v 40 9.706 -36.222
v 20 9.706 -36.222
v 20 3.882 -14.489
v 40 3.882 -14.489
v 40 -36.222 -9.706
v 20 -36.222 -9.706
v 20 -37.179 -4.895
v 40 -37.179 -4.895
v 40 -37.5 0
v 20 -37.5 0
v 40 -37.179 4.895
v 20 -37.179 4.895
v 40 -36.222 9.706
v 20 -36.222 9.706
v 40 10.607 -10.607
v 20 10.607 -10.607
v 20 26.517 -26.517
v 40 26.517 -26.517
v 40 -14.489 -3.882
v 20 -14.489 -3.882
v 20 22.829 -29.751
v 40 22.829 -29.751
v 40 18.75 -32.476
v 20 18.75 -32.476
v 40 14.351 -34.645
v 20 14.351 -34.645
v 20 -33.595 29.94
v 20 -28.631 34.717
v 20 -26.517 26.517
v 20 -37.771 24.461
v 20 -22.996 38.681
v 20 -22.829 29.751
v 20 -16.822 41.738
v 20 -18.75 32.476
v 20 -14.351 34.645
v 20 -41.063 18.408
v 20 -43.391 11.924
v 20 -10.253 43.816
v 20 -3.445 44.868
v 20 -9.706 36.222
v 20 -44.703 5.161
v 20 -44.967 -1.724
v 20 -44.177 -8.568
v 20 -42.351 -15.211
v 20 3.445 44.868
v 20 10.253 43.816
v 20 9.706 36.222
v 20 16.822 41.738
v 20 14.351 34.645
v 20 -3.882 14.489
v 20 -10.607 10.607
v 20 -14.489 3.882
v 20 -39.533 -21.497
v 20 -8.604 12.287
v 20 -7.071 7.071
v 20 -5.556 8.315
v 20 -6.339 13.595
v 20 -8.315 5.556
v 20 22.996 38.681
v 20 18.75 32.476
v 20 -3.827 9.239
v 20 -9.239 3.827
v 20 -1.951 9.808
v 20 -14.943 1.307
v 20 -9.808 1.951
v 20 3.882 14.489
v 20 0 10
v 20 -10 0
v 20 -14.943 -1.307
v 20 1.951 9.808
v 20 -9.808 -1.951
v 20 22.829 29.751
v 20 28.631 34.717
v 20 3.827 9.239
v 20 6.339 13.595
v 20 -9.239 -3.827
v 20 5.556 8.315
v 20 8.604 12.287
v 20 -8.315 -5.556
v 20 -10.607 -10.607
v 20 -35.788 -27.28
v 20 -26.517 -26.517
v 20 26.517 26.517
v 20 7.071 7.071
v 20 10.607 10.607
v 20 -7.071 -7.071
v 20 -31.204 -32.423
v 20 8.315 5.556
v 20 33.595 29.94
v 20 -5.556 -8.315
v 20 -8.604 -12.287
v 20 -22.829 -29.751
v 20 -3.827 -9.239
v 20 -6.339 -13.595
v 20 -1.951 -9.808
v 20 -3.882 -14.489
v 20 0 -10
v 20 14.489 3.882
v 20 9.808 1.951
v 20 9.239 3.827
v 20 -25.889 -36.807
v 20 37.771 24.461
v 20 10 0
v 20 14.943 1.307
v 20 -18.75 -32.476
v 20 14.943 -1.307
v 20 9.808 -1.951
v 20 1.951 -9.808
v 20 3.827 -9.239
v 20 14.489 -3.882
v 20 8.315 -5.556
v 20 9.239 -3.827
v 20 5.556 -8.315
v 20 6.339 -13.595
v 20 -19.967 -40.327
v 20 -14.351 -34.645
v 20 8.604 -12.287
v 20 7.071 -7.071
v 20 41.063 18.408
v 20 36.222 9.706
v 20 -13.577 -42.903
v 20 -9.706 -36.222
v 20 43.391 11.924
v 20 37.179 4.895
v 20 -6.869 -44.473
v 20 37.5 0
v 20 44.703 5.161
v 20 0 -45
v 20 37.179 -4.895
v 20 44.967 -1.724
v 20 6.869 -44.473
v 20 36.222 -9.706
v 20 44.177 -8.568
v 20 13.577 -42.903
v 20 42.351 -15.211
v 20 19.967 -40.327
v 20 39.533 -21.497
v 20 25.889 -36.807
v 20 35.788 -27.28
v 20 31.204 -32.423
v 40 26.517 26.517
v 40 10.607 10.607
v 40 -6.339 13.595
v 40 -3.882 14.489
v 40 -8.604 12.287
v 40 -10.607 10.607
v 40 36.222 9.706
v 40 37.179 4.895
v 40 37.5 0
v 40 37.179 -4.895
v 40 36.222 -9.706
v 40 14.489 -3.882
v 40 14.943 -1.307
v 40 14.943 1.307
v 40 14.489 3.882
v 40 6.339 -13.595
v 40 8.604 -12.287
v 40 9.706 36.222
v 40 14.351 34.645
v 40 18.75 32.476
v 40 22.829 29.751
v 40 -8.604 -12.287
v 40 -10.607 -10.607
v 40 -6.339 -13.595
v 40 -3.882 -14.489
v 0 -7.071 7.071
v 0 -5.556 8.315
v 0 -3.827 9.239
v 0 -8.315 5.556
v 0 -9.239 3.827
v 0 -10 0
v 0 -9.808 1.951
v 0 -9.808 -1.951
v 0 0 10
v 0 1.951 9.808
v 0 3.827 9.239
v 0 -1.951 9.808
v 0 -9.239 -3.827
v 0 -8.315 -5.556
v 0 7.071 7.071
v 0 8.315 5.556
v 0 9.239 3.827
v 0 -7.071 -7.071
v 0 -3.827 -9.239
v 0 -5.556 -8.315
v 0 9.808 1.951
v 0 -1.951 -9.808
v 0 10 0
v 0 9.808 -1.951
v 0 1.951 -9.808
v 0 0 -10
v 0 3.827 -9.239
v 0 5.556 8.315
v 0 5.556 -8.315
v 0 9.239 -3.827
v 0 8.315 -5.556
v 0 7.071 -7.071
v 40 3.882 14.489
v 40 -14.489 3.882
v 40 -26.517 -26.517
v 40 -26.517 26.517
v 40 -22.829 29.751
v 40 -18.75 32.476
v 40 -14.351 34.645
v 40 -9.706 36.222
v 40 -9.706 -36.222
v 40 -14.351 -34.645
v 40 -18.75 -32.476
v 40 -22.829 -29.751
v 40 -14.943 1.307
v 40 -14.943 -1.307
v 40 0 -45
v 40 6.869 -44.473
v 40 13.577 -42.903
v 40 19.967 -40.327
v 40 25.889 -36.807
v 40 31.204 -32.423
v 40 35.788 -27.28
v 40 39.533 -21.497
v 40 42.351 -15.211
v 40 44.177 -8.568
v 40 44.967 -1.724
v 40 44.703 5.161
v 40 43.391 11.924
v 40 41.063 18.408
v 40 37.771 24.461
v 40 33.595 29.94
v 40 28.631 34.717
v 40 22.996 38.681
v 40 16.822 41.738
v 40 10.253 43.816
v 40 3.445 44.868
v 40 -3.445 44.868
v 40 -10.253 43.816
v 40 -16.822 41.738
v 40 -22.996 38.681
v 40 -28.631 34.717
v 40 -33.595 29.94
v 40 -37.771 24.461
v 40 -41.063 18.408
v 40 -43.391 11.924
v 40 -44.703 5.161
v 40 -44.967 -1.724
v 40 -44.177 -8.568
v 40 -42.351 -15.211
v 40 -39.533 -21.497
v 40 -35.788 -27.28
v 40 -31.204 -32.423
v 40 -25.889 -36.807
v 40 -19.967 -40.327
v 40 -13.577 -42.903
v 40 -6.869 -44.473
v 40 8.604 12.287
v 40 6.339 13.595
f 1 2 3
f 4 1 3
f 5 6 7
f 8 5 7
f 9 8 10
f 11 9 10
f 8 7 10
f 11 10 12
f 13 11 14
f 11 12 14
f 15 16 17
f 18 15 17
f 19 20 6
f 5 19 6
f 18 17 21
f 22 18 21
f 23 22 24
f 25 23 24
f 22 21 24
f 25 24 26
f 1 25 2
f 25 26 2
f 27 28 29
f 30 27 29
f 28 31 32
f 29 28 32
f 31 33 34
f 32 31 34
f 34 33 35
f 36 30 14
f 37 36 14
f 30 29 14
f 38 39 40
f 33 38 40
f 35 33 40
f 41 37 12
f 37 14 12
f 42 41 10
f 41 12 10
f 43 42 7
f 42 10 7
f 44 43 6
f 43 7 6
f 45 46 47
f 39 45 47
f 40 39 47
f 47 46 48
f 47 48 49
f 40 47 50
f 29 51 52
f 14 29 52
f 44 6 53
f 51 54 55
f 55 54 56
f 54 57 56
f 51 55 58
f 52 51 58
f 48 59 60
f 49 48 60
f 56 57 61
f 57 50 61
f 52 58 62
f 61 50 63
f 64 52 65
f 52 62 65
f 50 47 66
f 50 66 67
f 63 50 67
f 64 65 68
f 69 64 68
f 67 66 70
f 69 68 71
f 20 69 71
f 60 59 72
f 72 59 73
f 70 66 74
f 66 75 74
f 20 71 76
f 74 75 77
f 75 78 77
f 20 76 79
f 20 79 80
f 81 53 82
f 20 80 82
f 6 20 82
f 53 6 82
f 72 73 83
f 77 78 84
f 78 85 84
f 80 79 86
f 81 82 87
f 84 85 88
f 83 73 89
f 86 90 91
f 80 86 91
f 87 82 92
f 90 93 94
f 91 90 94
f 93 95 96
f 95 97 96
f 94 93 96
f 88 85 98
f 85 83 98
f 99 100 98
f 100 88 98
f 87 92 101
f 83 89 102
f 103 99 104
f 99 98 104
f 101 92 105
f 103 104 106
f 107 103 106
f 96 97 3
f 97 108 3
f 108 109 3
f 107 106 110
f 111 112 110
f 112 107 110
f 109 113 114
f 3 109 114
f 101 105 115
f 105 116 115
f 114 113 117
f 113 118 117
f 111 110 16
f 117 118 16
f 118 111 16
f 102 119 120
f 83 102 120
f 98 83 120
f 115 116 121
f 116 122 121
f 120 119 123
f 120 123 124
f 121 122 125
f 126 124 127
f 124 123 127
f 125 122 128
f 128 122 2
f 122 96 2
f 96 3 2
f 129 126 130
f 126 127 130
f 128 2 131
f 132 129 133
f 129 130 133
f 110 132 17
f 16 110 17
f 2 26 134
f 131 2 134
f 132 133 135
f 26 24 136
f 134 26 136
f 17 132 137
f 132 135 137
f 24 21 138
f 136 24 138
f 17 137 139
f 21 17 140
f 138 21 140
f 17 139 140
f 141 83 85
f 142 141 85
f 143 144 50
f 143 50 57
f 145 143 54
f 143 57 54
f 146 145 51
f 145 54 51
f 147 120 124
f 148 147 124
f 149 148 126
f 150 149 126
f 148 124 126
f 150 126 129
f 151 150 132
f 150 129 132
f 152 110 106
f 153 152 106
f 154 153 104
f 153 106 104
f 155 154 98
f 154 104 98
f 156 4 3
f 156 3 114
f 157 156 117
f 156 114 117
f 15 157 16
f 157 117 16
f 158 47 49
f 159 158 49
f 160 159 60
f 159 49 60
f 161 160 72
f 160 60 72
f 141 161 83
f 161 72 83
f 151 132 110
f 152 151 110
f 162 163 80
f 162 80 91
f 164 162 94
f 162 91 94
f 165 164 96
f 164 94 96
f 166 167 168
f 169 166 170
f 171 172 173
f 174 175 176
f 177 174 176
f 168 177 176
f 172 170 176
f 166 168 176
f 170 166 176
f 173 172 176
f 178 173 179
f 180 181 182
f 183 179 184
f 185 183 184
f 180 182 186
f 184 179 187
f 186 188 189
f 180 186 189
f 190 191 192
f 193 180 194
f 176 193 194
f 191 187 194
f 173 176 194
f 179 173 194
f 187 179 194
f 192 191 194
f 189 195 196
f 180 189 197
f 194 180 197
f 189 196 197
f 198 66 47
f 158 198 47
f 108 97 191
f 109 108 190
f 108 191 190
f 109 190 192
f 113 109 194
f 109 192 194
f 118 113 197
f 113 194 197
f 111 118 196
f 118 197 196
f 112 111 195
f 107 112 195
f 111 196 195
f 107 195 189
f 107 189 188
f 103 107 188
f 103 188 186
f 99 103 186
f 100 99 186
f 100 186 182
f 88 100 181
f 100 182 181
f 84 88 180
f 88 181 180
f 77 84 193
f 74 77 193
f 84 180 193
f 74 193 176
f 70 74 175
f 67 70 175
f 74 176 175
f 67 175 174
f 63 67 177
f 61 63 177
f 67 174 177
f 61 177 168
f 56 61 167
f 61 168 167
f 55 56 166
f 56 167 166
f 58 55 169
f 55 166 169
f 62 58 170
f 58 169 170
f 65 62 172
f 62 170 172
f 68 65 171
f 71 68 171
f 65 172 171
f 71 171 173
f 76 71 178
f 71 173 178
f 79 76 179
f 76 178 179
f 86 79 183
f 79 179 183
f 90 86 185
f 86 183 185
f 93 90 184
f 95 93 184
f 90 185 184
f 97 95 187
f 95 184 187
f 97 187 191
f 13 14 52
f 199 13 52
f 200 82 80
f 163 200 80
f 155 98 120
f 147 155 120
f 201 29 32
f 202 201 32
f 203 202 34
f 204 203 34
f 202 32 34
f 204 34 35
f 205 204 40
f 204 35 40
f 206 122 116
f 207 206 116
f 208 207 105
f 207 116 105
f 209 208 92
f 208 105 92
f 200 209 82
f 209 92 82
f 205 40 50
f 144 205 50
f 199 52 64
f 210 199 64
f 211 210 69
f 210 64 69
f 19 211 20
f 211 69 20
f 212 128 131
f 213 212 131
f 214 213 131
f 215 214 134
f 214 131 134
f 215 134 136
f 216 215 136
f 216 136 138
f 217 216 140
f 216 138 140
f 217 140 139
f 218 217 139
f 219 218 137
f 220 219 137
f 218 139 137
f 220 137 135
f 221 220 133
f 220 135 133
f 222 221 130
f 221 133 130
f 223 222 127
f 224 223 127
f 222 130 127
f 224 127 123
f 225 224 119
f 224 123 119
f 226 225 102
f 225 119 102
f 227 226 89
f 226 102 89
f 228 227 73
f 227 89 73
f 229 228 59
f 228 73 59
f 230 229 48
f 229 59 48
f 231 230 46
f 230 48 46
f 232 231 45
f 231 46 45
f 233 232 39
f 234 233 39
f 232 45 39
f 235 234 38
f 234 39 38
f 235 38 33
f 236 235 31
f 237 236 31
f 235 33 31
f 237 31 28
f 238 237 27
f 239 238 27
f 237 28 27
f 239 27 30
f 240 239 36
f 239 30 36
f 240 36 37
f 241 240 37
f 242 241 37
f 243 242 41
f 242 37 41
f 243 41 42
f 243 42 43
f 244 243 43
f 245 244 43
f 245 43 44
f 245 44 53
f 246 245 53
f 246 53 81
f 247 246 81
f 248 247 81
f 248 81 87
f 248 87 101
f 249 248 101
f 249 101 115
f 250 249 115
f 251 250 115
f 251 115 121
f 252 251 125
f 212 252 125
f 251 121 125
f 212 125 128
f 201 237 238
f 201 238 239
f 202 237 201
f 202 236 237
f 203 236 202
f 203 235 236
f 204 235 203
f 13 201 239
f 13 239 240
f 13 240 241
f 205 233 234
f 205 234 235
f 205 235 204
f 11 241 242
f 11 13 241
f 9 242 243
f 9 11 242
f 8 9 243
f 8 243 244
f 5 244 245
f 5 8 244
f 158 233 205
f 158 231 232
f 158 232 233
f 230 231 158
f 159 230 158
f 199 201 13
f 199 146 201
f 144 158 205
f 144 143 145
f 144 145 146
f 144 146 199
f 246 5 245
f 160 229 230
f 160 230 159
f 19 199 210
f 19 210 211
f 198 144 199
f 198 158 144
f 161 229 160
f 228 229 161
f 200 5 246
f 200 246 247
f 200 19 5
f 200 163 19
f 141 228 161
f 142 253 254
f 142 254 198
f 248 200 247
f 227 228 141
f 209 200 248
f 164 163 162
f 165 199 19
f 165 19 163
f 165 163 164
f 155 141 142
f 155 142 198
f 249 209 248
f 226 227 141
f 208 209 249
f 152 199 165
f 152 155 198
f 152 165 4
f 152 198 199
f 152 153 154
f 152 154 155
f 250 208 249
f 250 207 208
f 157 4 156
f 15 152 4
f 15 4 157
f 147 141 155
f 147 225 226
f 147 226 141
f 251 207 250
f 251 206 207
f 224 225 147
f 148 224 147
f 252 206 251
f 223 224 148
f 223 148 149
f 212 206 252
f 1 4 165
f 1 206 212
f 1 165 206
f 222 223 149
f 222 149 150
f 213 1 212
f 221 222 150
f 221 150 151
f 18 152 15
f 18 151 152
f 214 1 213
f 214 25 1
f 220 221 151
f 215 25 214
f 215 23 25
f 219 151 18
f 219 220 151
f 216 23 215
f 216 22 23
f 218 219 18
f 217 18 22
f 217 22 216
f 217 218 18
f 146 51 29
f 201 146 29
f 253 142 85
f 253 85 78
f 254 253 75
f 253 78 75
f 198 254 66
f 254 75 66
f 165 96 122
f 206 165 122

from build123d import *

# Parameters (mm, degrees)
SKETCH_1_R          = 10
EXTRUDE_1_DEPTH     = 20
SKETCH_2_R          = 45
EXTRUDE_2_DEPTH     = 20
CUT_EXTRUDE_1_DEPTH = 20


with BuildPart() as part:
    # 草图1 → 凸台-拉伸1 (new body)
    with BuildSketch(Plane(origin=(0, 0, 0), x_dir=(0, 0, -1), z_dir=(1, 0, 0))):
        Circle(SKETCH_1_R)
    extrude(amount=EXTRUDE_1_DEPTH)

    # 草图2 → 凸台-拉伸2 (add)
    with BuildSketch(Plane(origin=(20, 0, 0), x_dir=(0, 0, -1), z_dir=(1, 0, 0))):
        Circle(SKETCH_2_R)
    extrude(amount=EXTRUDE_2_DEPTH)

    # 草图3 → 切除-拉伸1 (cut)
    with BuildSketch(Plane.ZY.offset(-20)):
        with BuildLine():
            Line((-9.705714191, 36.222218486), (-3.882285677, 14.488887394))
            ThreePointArc((-3.882285677, 14.488887394), (0, 15), (3.882285677, 14.488887394))
            Line((3.882285677, 14.488887394), (9.705714191, 36.222218486))
            ThreePointArc((9.705714191, 36.222218486), (0, 37.5), (-9.705714191, 36.222218486))
        make_face()
        with BuildLine():
            Line((26.516504294, 26.516504294), (10.606601718, 10.606601718))
            ThreePointArc((10.606601718, 10.606601718), (12.990381057, 7.5), (14.488887394, 3.882285677))
            Line((14.488887394, 3.882285677), (36.222218486, 9.705714191))
            ThreePointArc((36.222218486, 9.705714191), (32.475952642, 18.75), (26.516504294, 26.516504294))
        make_face()
        with BuildLine():
            Line((36.222218486, -9.705714191), (14.488887394, -3.882285677))
            ThreePointArc((14.488887394, -3.882285677), (12.990381057, -7.5), (10.606601718, -10.606601718))
            Line((10.606601718, -10.606601718), (26.516504294, -26.516504294))
            ThreePointArc((26.516504294, -26.516504294), (32.475952642, -18.75), (36.222218486, -9.705714191))
        make_face()
        with BuildLine():
            Line((9.705714191, -36.222218486), (3.882285677, -14.488887394))
            ThreePointArc((3.882285677, -14.488887394), (0, -15), (-3.882285677, -14.488887394))
            Line((-3.882285677, -14.488887394), (-9.705714191, -36.222218486))
            ThreePointArc((-9.705714191, -36.222218486), (0, -37.5), (9.705714191, -36.222218486))
        make_face()
        with BuildLine():
            Line((-26.516504294, -26.516504294), (-10.606601718, -10.606601718))
            ThreePointArc((-10.606601718, -10.606601718), (-12.990381057, -7.5), (-14.488887394, -3.882285677))
            Line((-14.488887394, -3.882285677), (-36.222218486, -9.705714191))
            ThreePointArc((-36.222218486, -9.705714191), (-32.475952642, -18.75), (-26.516504294, -26.516504294))
        make_face()
        with BuildLine():
            Line((-36.222218486, 9.705714191), (-14.488887394, 3.882285677))
            ThreePointArc((-14.488887394, 3.882285677), (-12.990381057, 7.5), (-10.606601718, 10.606601718))
            Line((-10.606601718, 10.606601718), (-26.516504294, 26.516504294))
            ThreePointArc((-26.516504294, 26.516504294), (-32.475952642, 18.75), (-36.222218486, 9.705714191))
        make_face()
    extrude(amount=-CUT_EXTRUDE_1_DEPTH, mode=Mode.SUBTRACT)


solid = part.part
